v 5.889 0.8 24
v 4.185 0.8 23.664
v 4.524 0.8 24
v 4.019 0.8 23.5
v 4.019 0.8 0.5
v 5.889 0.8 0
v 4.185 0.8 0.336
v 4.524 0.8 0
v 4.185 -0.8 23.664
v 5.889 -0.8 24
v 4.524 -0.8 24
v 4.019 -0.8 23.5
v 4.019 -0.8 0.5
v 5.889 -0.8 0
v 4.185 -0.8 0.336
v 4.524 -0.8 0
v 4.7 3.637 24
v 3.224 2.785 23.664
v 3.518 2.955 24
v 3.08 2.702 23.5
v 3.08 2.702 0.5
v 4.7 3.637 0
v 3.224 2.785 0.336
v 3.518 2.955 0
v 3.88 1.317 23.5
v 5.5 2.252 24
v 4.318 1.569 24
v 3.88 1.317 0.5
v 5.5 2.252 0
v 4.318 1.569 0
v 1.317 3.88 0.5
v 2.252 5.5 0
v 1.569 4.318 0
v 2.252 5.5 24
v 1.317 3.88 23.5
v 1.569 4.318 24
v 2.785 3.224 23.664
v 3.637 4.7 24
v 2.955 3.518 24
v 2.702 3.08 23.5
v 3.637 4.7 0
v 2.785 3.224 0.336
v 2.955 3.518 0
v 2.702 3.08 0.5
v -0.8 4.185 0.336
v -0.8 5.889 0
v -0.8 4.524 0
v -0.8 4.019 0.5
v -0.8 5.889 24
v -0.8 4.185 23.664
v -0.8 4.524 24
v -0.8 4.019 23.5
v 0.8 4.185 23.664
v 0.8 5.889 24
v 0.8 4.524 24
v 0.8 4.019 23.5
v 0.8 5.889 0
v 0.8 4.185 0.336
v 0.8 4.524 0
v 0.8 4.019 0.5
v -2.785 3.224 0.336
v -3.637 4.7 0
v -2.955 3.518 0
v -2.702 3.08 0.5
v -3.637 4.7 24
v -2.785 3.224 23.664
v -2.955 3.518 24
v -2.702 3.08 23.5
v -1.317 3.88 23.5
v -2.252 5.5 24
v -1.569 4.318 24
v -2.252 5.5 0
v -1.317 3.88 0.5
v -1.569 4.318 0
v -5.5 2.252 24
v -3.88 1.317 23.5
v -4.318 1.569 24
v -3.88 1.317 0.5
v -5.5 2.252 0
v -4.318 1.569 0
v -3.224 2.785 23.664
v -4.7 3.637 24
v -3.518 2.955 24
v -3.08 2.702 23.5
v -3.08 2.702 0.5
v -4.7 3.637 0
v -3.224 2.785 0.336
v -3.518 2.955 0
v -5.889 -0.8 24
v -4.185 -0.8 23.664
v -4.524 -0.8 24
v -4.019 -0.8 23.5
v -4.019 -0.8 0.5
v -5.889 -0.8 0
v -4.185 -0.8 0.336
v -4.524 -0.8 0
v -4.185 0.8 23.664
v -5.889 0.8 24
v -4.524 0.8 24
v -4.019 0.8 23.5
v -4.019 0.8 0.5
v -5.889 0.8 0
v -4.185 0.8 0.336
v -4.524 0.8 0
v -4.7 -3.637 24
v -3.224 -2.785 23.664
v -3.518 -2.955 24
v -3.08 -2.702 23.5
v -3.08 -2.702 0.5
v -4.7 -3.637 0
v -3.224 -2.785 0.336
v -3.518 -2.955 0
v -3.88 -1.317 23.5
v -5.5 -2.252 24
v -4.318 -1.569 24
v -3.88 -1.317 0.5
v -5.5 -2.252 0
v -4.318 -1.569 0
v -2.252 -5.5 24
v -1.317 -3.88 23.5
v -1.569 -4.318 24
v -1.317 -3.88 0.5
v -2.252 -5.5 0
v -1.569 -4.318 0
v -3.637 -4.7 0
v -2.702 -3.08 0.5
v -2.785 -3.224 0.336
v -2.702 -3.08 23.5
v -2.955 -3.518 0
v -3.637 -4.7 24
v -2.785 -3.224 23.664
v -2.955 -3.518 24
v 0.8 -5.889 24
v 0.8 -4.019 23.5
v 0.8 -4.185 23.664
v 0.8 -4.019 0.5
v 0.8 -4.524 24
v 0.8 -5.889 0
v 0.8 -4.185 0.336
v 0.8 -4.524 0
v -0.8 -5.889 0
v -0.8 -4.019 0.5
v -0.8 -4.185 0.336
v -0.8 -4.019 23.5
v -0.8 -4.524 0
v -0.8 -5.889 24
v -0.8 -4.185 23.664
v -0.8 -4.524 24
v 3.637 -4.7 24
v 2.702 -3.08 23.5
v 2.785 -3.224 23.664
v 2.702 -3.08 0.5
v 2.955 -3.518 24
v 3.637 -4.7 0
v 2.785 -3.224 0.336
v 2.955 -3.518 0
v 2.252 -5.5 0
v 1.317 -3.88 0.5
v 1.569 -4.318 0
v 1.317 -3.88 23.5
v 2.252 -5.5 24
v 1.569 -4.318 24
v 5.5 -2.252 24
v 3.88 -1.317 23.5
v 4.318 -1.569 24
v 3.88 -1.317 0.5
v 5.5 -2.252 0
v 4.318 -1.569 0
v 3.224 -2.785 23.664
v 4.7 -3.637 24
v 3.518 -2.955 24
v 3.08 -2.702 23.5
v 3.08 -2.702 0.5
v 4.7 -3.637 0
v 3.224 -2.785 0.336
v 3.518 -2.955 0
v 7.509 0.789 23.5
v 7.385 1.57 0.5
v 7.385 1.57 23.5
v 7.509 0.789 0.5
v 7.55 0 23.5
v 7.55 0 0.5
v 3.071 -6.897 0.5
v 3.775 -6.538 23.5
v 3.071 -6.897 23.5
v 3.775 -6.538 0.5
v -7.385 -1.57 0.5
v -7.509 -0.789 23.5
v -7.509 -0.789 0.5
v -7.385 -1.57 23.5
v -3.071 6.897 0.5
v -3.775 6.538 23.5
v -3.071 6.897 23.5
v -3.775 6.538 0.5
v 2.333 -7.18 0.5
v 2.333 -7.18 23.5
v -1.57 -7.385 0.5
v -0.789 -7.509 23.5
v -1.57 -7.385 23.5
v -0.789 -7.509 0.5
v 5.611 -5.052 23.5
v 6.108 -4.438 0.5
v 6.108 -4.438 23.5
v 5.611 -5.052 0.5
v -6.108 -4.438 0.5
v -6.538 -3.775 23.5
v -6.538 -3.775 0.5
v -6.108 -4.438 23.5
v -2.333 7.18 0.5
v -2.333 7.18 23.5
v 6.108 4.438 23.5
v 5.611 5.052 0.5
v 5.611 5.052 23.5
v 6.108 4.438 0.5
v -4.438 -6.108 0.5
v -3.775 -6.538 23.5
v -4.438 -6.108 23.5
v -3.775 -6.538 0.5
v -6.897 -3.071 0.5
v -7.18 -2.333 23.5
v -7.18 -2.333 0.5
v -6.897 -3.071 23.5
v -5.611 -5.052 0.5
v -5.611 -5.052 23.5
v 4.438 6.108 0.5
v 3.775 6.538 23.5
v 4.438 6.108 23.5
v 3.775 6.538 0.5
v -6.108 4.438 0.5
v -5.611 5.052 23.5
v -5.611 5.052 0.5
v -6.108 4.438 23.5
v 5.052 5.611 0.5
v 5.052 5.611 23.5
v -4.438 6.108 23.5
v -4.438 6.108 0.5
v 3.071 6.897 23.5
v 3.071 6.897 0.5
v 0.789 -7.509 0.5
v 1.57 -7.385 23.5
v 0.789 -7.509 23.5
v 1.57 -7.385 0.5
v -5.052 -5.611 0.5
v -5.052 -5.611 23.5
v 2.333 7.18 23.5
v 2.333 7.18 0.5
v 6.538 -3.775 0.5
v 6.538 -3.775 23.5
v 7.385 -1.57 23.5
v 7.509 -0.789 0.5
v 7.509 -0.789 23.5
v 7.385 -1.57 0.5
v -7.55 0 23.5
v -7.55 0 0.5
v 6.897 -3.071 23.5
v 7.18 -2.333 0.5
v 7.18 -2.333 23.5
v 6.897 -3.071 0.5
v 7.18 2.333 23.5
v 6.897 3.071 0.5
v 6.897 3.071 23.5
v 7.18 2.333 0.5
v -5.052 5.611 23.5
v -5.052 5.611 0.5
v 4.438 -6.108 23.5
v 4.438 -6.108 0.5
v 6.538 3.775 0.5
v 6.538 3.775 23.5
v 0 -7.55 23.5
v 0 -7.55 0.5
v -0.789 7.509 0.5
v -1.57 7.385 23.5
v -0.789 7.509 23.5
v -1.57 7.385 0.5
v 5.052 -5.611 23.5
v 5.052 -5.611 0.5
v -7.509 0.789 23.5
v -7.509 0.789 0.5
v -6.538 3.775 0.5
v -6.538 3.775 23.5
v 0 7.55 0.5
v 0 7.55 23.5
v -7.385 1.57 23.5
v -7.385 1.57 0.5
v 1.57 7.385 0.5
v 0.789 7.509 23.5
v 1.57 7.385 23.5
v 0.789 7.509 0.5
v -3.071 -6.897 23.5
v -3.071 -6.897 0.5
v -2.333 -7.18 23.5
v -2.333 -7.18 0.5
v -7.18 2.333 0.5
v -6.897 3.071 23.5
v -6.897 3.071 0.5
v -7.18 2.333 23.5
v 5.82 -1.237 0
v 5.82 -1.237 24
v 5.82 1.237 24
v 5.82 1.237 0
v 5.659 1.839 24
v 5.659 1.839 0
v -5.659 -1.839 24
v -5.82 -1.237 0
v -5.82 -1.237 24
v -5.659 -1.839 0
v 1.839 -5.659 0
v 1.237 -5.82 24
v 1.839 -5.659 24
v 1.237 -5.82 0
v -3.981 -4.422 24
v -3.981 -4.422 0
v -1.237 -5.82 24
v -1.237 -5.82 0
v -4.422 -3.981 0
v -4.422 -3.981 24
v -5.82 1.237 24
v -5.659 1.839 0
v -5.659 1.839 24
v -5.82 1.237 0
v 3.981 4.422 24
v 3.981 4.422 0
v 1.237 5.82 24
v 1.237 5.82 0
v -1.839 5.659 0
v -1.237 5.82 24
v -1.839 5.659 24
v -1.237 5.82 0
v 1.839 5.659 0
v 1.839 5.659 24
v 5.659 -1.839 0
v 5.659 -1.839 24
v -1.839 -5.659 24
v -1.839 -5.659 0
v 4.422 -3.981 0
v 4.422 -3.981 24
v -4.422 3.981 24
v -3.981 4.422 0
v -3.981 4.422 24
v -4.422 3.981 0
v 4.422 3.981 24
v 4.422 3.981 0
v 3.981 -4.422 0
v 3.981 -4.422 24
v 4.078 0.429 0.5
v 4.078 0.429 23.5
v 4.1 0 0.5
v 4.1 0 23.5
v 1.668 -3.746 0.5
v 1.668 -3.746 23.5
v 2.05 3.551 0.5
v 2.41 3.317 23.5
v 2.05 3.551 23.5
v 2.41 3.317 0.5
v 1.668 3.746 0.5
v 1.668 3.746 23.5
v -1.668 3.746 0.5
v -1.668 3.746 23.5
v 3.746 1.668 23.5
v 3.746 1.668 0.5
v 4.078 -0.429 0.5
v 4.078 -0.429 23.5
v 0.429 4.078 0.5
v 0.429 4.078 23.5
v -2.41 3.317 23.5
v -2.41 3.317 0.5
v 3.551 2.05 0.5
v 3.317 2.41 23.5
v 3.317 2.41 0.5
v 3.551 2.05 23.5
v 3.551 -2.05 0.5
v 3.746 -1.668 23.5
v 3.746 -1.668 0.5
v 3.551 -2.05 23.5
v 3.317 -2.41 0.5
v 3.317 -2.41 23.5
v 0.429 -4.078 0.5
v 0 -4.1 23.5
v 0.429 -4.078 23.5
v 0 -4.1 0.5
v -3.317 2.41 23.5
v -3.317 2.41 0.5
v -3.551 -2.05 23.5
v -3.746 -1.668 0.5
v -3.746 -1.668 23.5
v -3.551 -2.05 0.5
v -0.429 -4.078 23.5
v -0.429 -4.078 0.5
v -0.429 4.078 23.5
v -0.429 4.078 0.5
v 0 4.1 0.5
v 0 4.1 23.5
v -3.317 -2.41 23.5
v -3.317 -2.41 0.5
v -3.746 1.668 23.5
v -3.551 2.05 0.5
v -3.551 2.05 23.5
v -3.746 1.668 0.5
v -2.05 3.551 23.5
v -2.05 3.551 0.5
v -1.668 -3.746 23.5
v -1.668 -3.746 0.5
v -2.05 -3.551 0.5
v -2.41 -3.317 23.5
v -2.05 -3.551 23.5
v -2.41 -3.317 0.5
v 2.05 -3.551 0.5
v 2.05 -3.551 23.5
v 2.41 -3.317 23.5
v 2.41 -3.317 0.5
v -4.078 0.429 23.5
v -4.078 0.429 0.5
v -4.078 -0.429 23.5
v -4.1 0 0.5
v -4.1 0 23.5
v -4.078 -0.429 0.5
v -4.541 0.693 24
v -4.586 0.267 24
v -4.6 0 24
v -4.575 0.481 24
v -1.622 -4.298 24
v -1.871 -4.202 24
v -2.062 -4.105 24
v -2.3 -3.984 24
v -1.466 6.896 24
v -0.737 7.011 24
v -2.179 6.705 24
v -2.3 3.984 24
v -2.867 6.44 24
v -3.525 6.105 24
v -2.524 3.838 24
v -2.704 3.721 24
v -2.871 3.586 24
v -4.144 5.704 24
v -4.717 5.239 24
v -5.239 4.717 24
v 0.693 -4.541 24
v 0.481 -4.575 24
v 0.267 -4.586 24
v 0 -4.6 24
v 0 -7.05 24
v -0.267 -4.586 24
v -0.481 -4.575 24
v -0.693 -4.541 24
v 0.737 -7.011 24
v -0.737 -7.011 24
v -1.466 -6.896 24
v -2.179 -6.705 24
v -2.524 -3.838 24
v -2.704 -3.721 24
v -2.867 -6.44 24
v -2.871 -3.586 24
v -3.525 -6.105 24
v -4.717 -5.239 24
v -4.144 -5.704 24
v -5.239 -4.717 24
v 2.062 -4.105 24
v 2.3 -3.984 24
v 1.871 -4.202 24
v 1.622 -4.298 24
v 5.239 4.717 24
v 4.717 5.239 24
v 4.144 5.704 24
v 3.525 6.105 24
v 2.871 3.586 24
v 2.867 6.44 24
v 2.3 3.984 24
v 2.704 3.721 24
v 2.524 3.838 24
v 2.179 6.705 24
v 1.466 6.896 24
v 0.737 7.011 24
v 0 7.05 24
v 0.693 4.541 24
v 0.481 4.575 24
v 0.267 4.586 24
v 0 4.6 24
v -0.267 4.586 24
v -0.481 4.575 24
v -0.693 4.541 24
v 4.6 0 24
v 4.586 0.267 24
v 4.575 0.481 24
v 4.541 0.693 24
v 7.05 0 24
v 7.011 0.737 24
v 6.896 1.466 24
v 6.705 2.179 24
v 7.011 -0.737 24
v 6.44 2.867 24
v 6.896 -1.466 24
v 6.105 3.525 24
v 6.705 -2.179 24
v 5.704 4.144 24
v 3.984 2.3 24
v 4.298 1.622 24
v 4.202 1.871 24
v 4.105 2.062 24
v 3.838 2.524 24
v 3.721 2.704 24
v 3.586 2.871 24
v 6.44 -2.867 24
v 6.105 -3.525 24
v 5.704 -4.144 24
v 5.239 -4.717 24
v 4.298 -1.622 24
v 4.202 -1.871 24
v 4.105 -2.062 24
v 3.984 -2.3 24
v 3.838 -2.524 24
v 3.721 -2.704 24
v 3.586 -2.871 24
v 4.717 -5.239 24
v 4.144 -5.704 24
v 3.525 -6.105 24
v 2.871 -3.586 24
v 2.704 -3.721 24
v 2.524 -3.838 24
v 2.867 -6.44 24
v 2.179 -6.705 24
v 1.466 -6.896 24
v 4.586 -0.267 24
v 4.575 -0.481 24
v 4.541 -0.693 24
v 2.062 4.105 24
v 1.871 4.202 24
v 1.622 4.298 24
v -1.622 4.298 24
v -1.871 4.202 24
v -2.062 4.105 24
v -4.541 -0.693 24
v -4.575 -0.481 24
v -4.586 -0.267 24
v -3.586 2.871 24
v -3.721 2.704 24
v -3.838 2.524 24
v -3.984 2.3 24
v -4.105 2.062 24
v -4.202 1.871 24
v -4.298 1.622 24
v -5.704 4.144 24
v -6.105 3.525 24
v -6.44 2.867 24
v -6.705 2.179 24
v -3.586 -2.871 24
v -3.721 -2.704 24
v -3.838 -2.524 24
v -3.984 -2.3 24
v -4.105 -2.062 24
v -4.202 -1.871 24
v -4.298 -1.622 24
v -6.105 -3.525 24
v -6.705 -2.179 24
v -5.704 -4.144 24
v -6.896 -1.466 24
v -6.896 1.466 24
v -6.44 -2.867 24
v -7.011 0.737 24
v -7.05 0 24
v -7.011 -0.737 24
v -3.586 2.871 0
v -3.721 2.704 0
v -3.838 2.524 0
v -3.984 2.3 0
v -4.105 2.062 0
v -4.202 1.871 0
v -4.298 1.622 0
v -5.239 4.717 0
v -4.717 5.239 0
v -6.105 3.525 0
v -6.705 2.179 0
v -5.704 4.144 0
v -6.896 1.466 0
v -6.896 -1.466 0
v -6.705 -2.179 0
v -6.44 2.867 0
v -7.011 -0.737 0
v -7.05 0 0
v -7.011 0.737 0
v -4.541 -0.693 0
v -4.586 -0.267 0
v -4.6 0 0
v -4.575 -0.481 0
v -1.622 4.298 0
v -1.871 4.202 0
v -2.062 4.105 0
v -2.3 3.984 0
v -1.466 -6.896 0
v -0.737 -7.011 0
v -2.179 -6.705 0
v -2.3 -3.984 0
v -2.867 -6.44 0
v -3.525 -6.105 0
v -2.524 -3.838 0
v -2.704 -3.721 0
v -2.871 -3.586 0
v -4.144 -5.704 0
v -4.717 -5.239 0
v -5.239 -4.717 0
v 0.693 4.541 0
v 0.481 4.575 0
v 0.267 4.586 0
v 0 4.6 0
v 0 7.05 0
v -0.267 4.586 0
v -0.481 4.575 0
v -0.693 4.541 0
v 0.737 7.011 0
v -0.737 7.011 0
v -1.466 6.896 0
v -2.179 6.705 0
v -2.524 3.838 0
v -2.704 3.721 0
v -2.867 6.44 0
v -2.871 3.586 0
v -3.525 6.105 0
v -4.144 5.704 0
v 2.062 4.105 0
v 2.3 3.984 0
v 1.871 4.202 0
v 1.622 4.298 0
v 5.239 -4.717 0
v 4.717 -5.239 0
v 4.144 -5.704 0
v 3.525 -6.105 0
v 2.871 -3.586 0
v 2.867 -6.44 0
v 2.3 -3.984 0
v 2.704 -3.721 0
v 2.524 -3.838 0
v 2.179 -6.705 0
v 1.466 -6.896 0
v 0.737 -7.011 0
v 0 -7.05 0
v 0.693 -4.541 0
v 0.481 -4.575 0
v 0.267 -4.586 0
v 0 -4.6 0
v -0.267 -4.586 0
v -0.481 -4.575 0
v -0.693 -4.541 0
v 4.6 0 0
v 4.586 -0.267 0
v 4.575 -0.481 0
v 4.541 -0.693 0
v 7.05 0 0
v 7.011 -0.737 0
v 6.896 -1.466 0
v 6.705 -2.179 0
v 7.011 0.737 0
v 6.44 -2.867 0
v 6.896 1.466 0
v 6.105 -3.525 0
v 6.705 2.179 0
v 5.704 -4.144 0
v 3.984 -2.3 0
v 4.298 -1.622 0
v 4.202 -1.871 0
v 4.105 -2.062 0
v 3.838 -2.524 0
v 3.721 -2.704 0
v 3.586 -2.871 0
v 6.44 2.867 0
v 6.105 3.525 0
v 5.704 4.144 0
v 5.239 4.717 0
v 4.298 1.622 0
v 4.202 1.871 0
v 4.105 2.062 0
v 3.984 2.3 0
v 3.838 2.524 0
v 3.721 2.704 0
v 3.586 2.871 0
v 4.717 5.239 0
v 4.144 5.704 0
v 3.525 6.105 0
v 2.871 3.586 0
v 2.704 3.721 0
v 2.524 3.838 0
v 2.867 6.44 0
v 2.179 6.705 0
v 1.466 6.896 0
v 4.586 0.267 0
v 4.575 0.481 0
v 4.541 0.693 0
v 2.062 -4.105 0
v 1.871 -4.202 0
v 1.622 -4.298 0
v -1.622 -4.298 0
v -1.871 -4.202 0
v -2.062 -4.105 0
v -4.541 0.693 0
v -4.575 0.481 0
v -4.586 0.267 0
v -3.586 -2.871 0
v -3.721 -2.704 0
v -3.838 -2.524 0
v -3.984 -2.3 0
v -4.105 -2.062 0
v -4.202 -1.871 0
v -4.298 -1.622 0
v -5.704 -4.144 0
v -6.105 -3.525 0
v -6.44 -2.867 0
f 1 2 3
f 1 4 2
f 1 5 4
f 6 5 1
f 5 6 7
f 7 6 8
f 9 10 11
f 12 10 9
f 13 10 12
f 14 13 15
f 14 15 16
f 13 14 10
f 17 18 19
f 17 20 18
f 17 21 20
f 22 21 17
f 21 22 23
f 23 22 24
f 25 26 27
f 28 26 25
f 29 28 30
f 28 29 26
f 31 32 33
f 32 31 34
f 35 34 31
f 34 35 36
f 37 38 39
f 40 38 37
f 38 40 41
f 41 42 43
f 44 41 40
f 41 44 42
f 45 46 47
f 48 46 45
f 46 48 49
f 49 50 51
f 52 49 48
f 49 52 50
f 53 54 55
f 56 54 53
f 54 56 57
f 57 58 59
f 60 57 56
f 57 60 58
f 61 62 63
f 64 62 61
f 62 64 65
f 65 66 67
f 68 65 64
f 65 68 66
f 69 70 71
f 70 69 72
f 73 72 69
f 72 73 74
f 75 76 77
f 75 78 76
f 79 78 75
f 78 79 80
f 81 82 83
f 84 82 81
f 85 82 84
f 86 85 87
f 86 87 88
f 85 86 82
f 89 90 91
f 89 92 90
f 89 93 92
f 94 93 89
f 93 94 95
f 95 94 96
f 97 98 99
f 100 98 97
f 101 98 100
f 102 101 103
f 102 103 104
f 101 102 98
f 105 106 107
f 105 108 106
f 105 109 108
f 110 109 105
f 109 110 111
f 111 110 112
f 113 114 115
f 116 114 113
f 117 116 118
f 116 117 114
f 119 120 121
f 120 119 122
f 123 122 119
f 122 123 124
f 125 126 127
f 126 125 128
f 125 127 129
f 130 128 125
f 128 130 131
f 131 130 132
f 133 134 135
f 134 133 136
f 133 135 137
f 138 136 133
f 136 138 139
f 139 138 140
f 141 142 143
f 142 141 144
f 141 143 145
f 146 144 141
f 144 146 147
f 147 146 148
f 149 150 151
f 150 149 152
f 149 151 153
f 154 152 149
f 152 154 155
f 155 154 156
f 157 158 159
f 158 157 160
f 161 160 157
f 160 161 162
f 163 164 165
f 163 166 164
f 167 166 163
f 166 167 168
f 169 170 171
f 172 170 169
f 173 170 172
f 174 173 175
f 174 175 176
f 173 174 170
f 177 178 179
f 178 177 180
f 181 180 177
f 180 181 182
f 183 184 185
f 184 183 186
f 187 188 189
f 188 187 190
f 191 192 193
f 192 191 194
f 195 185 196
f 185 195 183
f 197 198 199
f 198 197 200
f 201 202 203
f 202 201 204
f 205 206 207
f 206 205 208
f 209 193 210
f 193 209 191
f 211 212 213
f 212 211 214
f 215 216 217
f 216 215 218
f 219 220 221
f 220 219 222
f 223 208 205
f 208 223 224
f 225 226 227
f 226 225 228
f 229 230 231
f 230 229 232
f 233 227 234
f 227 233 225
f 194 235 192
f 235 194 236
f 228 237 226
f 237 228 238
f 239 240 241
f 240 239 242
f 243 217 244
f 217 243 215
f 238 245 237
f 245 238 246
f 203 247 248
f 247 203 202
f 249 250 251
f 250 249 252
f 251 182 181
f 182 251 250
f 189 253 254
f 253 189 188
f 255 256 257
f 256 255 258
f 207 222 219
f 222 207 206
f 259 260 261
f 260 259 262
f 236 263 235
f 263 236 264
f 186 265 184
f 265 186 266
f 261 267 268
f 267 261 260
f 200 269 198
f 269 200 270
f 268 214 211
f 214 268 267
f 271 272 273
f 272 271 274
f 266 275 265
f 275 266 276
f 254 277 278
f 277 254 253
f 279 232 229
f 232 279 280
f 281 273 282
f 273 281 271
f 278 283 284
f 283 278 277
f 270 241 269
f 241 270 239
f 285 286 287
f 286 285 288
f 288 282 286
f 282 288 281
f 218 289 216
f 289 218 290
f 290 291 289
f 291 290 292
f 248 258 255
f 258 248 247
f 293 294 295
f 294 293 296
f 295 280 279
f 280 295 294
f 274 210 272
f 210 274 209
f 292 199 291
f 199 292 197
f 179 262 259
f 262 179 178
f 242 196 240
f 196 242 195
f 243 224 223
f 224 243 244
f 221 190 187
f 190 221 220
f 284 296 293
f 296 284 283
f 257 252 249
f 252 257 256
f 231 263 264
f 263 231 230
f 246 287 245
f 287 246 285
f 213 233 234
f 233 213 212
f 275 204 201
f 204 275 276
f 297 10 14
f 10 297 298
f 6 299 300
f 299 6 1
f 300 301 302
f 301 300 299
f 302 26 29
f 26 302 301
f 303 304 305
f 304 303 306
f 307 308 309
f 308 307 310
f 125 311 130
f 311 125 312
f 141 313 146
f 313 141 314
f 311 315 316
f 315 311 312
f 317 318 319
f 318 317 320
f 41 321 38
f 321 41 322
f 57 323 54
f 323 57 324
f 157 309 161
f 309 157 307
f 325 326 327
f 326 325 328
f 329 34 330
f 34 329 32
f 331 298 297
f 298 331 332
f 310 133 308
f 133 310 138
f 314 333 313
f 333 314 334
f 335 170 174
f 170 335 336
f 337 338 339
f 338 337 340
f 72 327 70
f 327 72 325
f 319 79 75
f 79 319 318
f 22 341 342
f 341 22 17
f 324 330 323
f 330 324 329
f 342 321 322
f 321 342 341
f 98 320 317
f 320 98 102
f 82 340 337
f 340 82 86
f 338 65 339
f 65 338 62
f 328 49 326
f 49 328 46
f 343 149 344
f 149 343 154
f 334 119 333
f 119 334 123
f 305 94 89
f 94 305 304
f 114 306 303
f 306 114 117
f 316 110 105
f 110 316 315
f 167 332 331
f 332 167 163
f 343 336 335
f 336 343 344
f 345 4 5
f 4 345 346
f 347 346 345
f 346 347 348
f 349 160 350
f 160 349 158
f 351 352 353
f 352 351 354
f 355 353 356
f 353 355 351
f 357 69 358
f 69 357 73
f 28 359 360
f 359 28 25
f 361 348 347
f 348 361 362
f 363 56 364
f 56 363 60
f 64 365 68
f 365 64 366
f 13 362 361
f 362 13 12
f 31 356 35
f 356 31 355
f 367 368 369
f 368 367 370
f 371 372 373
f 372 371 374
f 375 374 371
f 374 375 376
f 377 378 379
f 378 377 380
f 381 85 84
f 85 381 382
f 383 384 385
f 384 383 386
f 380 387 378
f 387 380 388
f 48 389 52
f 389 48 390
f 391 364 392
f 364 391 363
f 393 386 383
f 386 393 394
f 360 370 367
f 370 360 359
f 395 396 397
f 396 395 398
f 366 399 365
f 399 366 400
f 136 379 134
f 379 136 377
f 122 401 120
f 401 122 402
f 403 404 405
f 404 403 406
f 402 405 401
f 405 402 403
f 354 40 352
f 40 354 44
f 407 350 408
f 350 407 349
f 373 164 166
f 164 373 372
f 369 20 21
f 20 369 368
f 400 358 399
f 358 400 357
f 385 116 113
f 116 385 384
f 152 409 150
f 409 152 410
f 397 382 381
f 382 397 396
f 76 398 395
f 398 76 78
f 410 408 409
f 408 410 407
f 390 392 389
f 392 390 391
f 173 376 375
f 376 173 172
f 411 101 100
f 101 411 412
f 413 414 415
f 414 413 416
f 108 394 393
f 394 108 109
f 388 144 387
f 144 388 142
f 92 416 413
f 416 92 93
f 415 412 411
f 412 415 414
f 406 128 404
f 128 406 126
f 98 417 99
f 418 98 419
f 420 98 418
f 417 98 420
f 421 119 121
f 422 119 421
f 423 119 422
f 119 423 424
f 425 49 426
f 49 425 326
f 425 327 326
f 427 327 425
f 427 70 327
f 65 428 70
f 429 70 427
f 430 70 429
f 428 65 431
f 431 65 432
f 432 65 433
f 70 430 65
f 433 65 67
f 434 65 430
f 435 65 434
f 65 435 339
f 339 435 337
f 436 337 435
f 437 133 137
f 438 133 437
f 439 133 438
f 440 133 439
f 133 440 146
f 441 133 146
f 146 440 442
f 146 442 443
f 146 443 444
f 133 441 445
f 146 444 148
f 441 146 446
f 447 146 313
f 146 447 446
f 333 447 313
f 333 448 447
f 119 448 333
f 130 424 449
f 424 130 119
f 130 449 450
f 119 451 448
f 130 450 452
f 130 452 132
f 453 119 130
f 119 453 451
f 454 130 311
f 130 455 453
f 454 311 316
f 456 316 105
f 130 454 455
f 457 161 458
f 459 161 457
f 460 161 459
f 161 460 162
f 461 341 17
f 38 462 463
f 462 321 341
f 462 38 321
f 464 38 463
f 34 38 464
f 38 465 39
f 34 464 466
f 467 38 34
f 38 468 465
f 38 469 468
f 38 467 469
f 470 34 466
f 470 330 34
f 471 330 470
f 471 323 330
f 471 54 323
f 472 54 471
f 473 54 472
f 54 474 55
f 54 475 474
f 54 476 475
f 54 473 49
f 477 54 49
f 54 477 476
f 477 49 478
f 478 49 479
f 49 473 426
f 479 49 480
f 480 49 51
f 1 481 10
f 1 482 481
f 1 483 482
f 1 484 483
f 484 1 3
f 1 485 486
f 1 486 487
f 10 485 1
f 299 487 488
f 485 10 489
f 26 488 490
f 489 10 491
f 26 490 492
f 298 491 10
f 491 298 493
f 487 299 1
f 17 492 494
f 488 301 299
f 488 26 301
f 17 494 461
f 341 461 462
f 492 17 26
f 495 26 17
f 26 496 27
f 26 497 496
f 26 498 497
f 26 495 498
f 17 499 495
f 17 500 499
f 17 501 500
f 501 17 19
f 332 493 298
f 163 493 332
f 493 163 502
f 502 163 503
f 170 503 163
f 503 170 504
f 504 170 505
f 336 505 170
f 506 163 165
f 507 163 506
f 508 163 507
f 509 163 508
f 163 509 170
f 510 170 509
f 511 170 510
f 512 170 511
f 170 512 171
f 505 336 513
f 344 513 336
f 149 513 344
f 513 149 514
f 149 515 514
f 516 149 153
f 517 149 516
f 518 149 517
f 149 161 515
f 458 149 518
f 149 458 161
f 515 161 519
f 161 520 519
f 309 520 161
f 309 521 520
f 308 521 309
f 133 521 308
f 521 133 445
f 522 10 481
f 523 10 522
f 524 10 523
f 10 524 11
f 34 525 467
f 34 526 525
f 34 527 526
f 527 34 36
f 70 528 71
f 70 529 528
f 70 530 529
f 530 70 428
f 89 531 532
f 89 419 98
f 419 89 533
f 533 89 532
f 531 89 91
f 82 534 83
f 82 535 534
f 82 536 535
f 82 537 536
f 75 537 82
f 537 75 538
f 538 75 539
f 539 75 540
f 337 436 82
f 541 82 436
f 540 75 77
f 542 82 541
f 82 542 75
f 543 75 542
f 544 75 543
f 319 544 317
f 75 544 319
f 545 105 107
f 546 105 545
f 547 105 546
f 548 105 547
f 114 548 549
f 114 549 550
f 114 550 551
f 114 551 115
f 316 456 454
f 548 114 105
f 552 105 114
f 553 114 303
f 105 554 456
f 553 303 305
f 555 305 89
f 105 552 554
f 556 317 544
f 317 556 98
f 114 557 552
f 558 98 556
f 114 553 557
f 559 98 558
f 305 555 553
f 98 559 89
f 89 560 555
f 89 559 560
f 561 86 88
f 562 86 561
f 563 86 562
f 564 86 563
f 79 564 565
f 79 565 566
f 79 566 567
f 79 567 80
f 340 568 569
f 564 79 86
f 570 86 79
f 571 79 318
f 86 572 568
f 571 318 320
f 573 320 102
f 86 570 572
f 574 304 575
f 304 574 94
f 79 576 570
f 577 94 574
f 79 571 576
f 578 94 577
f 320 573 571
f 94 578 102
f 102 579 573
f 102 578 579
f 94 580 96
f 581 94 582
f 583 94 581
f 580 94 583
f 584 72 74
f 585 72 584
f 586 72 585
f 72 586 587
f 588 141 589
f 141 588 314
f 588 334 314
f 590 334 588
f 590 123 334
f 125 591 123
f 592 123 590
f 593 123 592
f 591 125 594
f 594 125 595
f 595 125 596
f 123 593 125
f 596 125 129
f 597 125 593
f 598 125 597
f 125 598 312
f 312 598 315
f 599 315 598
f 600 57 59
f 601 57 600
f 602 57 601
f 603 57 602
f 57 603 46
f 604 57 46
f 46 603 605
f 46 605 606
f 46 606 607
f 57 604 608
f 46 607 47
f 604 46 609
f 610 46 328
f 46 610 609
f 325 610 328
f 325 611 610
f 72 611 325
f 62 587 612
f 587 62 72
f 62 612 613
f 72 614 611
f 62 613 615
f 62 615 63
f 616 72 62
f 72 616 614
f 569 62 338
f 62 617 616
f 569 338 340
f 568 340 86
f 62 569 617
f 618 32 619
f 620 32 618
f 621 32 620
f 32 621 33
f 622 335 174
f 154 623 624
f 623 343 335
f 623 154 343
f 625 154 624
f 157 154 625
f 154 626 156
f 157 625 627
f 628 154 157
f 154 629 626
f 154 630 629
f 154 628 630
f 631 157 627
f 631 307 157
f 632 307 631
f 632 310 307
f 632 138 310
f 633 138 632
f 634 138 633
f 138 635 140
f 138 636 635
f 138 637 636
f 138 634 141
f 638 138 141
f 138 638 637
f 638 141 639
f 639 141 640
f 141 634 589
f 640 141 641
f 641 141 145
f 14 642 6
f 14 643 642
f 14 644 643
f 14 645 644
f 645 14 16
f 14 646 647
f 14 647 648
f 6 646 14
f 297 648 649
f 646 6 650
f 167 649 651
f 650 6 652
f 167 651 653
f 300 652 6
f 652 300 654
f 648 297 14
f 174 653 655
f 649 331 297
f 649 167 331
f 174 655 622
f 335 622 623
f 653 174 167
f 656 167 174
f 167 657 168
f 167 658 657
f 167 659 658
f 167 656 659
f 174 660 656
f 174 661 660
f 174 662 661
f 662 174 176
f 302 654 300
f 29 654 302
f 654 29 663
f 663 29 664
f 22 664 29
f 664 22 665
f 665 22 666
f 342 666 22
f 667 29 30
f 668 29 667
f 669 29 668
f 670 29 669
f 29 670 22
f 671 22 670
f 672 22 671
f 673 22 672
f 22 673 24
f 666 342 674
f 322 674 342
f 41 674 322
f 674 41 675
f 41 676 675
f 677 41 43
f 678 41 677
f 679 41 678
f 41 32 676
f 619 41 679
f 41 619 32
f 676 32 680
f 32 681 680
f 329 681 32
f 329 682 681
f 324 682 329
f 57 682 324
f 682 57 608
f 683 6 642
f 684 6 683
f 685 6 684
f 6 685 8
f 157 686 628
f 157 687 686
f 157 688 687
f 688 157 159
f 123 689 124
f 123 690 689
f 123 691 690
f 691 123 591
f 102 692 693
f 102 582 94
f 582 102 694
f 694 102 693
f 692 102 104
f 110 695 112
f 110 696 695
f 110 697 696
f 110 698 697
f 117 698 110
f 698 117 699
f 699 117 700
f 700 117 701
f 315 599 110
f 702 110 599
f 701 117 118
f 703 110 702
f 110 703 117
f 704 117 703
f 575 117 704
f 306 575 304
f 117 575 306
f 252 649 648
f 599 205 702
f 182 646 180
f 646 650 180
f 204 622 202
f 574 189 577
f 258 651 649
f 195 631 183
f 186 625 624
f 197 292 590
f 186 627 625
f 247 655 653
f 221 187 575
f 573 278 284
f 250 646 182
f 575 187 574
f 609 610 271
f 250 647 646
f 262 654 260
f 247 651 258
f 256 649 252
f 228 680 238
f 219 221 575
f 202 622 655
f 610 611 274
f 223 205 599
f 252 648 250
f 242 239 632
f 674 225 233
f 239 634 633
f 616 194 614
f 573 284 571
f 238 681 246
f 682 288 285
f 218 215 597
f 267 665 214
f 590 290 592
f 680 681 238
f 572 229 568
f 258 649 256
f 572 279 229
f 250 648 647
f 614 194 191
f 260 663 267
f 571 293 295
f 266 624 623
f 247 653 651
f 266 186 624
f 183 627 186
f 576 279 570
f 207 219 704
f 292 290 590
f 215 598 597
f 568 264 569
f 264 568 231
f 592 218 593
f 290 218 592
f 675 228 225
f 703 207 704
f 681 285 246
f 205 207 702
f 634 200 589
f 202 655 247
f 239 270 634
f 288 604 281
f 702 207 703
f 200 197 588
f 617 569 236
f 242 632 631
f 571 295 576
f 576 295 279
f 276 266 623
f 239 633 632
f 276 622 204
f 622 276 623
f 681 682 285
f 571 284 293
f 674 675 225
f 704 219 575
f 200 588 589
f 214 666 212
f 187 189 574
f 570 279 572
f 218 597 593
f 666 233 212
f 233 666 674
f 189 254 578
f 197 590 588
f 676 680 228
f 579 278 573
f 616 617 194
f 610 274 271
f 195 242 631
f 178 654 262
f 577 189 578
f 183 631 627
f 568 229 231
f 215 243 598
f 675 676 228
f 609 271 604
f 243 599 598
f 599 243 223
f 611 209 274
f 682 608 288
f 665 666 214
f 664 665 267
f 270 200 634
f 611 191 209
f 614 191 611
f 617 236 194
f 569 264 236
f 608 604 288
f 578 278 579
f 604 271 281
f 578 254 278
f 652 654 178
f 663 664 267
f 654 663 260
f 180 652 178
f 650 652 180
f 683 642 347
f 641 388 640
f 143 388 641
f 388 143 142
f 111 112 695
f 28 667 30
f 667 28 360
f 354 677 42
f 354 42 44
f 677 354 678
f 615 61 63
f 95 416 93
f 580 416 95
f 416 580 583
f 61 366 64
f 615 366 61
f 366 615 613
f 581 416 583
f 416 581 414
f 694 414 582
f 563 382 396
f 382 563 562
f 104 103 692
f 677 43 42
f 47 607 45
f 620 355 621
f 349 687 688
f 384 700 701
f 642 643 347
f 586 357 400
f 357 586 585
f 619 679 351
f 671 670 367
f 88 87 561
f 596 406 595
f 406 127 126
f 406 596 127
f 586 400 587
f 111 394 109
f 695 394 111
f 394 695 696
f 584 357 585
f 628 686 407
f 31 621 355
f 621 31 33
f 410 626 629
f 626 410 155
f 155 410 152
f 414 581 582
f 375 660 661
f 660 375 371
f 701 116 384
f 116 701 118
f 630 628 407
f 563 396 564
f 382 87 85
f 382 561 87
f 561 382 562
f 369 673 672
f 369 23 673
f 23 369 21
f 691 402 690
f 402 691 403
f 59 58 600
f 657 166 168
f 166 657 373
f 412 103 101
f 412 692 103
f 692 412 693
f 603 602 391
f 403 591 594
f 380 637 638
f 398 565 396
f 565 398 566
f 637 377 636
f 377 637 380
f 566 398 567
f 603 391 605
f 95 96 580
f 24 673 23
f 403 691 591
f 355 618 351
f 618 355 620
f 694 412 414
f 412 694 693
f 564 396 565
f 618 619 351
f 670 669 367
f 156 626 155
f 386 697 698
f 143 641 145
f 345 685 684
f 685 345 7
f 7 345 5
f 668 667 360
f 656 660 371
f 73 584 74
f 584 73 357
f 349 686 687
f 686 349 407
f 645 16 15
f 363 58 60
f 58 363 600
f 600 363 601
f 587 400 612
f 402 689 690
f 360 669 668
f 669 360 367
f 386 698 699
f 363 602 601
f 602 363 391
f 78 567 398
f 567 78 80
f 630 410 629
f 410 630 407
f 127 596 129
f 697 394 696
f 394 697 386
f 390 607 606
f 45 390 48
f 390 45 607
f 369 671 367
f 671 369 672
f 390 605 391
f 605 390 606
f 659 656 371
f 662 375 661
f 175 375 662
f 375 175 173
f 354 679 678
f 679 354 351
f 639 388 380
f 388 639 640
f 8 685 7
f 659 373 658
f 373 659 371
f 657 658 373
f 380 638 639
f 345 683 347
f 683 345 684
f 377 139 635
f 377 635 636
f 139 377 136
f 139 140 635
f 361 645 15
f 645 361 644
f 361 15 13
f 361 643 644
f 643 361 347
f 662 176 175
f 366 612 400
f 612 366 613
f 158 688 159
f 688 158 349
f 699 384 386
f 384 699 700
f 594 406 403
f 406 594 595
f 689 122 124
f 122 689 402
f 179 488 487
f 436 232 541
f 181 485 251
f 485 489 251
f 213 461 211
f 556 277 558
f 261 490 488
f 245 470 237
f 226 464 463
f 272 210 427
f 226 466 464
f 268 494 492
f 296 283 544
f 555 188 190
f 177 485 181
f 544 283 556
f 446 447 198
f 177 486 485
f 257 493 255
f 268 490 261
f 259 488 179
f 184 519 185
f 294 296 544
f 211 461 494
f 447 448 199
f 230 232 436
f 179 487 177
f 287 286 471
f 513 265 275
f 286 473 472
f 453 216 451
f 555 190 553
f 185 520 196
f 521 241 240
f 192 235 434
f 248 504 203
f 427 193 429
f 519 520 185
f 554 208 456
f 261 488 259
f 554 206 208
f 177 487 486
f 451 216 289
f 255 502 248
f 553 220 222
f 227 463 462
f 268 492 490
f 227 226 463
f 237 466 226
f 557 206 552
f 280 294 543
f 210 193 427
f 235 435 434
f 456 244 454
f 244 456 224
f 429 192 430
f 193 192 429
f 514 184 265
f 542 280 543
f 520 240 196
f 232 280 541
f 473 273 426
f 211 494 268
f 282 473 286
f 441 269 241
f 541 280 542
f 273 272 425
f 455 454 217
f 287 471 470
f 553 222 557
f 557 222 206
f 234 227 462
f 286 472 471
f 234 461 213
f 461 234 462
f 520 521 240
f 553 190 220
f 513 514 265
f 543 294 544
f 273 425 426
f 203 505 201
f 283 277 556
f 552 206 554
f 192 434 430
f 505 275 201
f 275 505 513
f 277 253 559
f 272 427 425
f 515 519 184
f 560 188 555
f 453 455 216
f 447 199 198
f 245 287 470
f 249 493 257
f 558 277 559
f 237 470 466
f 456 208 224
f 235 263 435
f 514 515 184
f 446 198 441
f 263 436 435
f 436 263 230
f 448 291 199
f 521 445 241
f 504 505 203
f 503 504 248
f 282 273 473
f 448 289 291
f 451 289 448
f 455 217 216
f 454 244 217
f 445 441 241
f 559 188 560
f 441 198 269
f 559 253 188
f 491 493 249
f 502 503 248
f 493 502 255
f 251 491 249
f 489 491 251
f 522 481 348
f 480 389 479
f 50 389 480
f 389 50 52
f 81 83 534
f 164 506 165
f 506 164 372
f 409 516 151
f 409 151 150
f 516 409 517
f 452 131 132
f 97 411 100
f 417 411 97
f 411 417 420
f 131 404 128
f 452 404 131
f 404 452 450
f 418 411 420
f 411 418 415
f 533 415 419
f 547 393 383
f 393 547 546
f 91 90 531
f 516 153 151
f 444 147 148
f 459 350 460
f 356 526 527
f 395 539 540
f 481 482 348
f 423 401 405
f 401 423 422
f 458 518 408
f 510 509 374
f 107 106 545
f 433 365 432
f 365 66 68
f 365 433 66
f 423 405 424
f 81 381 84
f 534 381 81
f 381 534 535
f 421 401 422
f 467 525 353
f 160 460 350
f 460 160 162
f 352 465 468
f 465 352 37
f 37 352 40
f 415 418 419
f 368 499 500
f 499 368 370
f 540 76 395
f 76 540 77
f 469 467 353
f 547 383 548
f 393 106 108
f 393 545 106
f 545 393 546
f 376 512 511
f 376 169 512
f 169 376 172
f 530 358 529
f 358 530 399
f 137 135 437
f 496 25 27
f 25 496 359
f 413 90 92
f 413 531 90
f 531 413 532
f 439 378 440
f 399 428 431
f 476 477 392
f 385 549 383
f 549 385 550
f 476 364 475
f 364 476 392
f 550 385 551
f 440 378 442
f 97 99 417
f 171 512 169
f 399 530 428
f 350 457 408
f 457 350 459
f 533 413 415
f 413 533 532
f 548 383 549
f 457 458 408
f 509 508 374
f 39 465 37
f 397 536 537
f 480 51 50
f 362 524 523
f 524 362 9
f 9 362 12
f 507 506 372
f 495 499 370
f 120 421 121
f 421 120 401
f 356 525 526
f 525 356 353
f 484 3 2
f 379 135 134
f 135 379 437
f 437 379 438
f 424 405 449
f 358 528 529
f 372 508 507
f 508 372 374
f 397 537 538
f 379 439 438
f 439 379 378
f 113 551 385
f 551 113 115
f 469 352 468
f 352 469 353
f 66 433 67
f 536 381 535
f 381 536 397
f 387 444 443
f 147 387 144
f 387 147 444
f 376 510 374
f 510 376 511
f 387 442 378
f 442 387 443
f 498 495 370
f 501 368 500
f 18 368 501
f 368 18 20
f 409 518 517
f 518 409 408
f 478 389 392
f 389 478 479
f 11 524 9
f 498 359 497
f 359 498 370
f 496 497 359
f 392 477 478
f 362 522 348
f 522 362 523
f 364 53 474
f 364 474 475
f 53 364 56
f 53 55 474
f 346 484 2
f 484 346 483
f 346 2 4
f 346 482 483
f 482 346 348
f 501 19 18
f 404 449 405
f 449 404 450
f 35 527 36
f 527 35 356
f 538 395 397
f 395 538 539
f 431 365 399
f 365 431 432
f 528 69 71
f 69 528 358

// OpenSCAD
 /*
 * Customizable Linear Bushing - https://www.thingiverse.com/thing:2202854
 * by Dennis Hofmann - https://www.thingiverse.com/mightynozzle/about
 * created 2017-03-25
 * updated 2018-02-15
 * updated 2021-03-24 by John Tasto
 * version v1.9
 *
 * Changelog
 * --------------
 * v1.9:
 *      - hole option added
 * v1.8:
 *      - groove option added
 * v1.7:
 *      - fixed inner diameter
 * v1.6:
 *      - added chamfer angle option
 * v1.5:
 *      - fixed graphic glitch
 * v1.4:
 *      - added chamfer option
 *
 * v1.1-1.3:
 *      - initial model with minor changes in description
 *
 * --------------
 *
 * This work is licensed under the Creative Commons - Attribution - Non-Commercial license.
 * https://creativecommons.org/licenses/by-nc/3.0/
 */

 // Parameter Section //
//-------------------//

/* [Bushing Settings] */

// Equals dr in technical diagrams. Use the outer diameter of the rod + tolerance value of your printer. Do some test prints before print a whole set of bushings. Best way in my case is to choose the bushing where can push it in with some effort on the rod and slide it by hand without any tools. Then slide it back and forth along the rod, until the bushing has the expected behavior. I suggest you not to use any drill or heat. The sliding of the bushing generates enough heat from its friction against the rod. Standard values: 6.00 for LM6(L)UU, 8.00 (default 8.15) for LM8(L)UU, 10.00 for LM10(L)UU, 12.00 for LM12(L)UU, 16.00 for LM16UU, ...
inner_diameter_in_millimeter = 8.20;

// Equals D in technical diagrams. Use the inner diameter of housing where the bushing sits + tolerance value of your printer. Depends on the filament you use and the total wall thickness of the bushings, the bushing shouldn't fit to tight in the housing. Standard values: 12.0 for LM6(L)UU, 15.0 (default) for LM8(L)UU, 19.0 for LM10(L)UU, 21.0 for LM12(L)UU, 28.0 for LM16UU, ...
outer_diameter_in_millimeter = 15.10;

// Equals L in technical diagrams. Standard values: 19.0 for LM6UU, 24.0 for LM8UU, 29.0 for LM10UU, 30.0 for LM12UU, 35.0 for LM6LUU, 37.0 for LM16UU, 45.0 for LM8LUU, 55.0 for LM10LUU, 57.0 for LM12LUU, ...
bushing_length_in_millimeter = 24.0;

// Use a value to get straight primeters without any zigzag between the outer and inner perimeter. I use the value of 0.48 for 0.4 nozzle. This is the auto extrusion width of 0.48 of simplify3d. More information about this in the description of this design on thingiverse.
extrusion_width_in_millimeter = 0.4;

// Use even numbers. E.g. 4 for LM8(L)UU. Don't forget to set the perimeter number in your Slicer!
number_of_perimeters = 4; //[2:2:10]

// Choose a number to provide a gap between the teeth in the bushing. E.g. 8 or 10 for LM8(L)UU. The tooth width depends on the extrusion_width_in_millimeter and the number_of_perimeters.
number_of_teeth = 12; //[3:20]

// Radius of the chamfer. Set a chamfer if you want to insert the rod easier. This also helps if your prints tends to create elephant foot in the first few layers. A value between 0.3 and 1.0 might be a good value. Set a value above 0 might destroy the preview of the bushing, but the resulting .stl file will be correct.
chamfer_radius_in_millimeter = .5;

// Set the angle of the chamfer.
chamfer_angle_in_degree = 45.0; // [30:75]

// Equals W in technical diagram. 1.1 for LM6/8(L)UU, 1.3 for LM10/12/13(L)UU, 1.6 for LM16/20(L)UU, 1.85 for LM25/30(L)UU, 2.1 for LM35/40(L)UU, 2.6 for LM50(L)UU, 3.15 for LM60(L)UU
groove_length_in_millimeter = 3.1;
// groove_length_in_millimeter = 3;  // the chamfers might be enough slop
// groove_length_in_millimeter = 0;

// Equals D1 in technical diagram. 11.5 for LM6(L)UU, 14.3 for LM8(L)UU, 18.0 for LM10(L)UU, 20.0 for LM12(L)UU, 22.0 for LM13(L)UU, 27.0 for LM16(L)UU, 30.5 for LM20(L)UU, 38.0 for LM25(L)UU, 43.0 for LM30(L)UU, 49.0 for LM35(L)UU, 57.0 for LM40(L)UU, 76.5 for LM50(L)UU, 86.5 for LM60(L)UU
groove_diameter_in_millimeter = outer_diameter_in_millimeter - (4+0.2-2.5)*2;    // 4 screw + 0.2 slop - 2.5 wall = 2x1.65
// groove_diameter_in_millimeter = outer_diameter_in_millimeter - (4-1.1-2.5)*2;  // 4 screw - 2x0.55 washer - 2.5 wall = 2x0.4
// groove_diameter_in_millimeter = outer_diameter_in_millimeter - (4-0.55-2.5)*2; // 4 screw - 0.55 washer - 2.5 wall = 2x0.95
// groove_diameter_in_millimeter = outer_diameter_in_millimeter - (3-2.5)*2;      // 3 screw - 2.5 wall = 2x0.5
// groove_diameter_in_millimeter = outer_diameter_in_millimeter;

// Equals B in technical diagram. Outer distance between both grooves. 13.5 for LM6UU, 17.5 for LM8UU, 22.0 for LM10UU, 23.0 for LM12UU, 26.5 for LM16UU, 27.0 for LM6LUU, 35.0 for LM8UU, 44.0 for LM10LUU, 46.0 for LM12LUU, 53.0 for LM16LUU
groove_distance_in_millimeter = 16 + groove_length_in_millimeter;

groove = false;
hole = false;

/* [Hidden] */
inner_dia = inner_diameter_in_millimeter;
outer_dia = outer_diameter_in_millimeter;
bushing_l = bushing_length_in_millimeter;
extrusion_w = extrusion_width_in_millimeter;
perimeters = number_of_perimeters;
teeth = number_of_teeth;
chamfer_a = chamfer_angle_in_degree;
chamfer_r = chamfer_radius_in_millimeter;
chamfer_h = tan(chamfer_a) * chamfer_r;
groove_l = groove_length_in_millimeter;
groove_dia = groove_diameter_in_millimeter;
groove_d = groove_distance_in_millimeter;


$fn=60;

 // Program Section //
//-----------------//

color("HotPink") difference() {
    bushing();
    if(chamfer_r > 0) {
        chamfer_cut();
        translate([0, 0, bushing_l]) {
            rotate([180,0,0]) {
                chamfer_cut();
            }
        }
    }
    if (groove) groove_cut();
    if (hole) hole_cut();
}


 // Module Section //
//----------------//

module bushing() {
    translate([0, 0, bushing_l / 2]) {
        difference() {
            union() {
                difference() {
                    for(tooth = [0 : teeth - 1])
                        rotate([0, 0, 360 / teeth * tooth]) {
                            translate([outer_dia / 4, 0, 0]) {
                                cube([outer_dia / 2, extrusion_w * perimeters, bushing_l + 1], center = true);
                            }
                        }
                        translate([0, 0, -bushing_l / 2 - 1]) {
                            ring(outer_dia * 2, outer_dia, bushing_l + 2);
                        }
                    }
                    translate([0, 0, -bushing_l / 2 - 1]) {
                        ring(outer_dia, outer_dia - extrusion_w * perimeters * 2, bushing_l + 2);
                    }
            }
            cylinder(d = inner_dia, h = bushing_l + 2, center = true);
            translate([0, 0, bushing_l / 2]) {
                cylinder(d = outer_dia + 1, h = 2, $f = 16);
            }
            translate([0, 0, -(bushing_l / 2 + 2)]) {
                cylinder(d = outer_dia + 1, h = 2, $f = 16);
            }
        }
    }
}

module ring(d1, d2, height, chamfer=0) {
    dD = d1 - d2;
    exD = 1/tan(chamfer);
    exHeight = tan(chamfer)*dD/2;
    difference() {
        translate([0,0,-exHeight  ]) cylinder(d = d1, h = height + exHeight*2, center = false);
        translate([0,0,-exHeight-2]) cylinder(d = d2, h = height + exHeight*2 + 4, center = false);
        translate([0,0,-exHeight-1]) cylinder(d1 = d1 + exD*2, d2 = d2 - exD*2, h = exHeight + 2, center = false);
        translate([0,0,   height-1]) cylinder(d1 = d2 - exD*2, d2 = d1 + exD*2, h = exHeight + 2, center = false);
    }
}

module chamfer_cut() {
    union() {
        difference() {
            translate([0, 0, -1]) {
                cylinder(d = outer_dia + 1, h = chamfer_h + 1);
            }
            intersection() {
                cylinder(d = outer_dia, h = chamfer_h);
                cylinder(d1 = outer_dia - chamfer_r * 2, d2 = outer_dia, h = chamfer_h);
            }
        }
        translate([0, 0, -chamfer_h]) {
            intersection() {
                cylinder(d = inner_dia + chamfer_r * 4, h = chamfer_h * 2);
                cylinder(d1 = inner_dia + chamfer_r * 4, d2 = inner_dia, h = chamfer_h * 2);
            }
        }
        translate([0, 0, -10]) {
            cylinder(d = outer_dia + 1, h = 10);
        }
    }
}

module groove_cut() {
    translate([0, 0, bushing_l / 2 - groove_d / 2]) {
        ring(outer_dia + 1, groove_dia, groove_l, chamfer_a);
    }
    translate([0, 0, bushing_l - ((bushing_l / 2) - (groove_d / 2) + groove_l)]) {
        ring(outer_dia + 1, groove_dia, groove_l, chamfer_a);
    }
}

module hole_cut() {
    translate([groove_dia / 2, 0, bushing_l / 2 - groove_d / 2 + groove_l / 2]) {
        rotate([0, 90, 0]) cylinder(d = groove_l, h = outer_dia);
    }
    translate([groove_dia / 2, 0, bushing_l / 2 + groove_d / 2 - groove_l / 2]) {
        rotate([0, 90, 0]) cylinder(d = groove_l, h = outer_dia);
    }
}
